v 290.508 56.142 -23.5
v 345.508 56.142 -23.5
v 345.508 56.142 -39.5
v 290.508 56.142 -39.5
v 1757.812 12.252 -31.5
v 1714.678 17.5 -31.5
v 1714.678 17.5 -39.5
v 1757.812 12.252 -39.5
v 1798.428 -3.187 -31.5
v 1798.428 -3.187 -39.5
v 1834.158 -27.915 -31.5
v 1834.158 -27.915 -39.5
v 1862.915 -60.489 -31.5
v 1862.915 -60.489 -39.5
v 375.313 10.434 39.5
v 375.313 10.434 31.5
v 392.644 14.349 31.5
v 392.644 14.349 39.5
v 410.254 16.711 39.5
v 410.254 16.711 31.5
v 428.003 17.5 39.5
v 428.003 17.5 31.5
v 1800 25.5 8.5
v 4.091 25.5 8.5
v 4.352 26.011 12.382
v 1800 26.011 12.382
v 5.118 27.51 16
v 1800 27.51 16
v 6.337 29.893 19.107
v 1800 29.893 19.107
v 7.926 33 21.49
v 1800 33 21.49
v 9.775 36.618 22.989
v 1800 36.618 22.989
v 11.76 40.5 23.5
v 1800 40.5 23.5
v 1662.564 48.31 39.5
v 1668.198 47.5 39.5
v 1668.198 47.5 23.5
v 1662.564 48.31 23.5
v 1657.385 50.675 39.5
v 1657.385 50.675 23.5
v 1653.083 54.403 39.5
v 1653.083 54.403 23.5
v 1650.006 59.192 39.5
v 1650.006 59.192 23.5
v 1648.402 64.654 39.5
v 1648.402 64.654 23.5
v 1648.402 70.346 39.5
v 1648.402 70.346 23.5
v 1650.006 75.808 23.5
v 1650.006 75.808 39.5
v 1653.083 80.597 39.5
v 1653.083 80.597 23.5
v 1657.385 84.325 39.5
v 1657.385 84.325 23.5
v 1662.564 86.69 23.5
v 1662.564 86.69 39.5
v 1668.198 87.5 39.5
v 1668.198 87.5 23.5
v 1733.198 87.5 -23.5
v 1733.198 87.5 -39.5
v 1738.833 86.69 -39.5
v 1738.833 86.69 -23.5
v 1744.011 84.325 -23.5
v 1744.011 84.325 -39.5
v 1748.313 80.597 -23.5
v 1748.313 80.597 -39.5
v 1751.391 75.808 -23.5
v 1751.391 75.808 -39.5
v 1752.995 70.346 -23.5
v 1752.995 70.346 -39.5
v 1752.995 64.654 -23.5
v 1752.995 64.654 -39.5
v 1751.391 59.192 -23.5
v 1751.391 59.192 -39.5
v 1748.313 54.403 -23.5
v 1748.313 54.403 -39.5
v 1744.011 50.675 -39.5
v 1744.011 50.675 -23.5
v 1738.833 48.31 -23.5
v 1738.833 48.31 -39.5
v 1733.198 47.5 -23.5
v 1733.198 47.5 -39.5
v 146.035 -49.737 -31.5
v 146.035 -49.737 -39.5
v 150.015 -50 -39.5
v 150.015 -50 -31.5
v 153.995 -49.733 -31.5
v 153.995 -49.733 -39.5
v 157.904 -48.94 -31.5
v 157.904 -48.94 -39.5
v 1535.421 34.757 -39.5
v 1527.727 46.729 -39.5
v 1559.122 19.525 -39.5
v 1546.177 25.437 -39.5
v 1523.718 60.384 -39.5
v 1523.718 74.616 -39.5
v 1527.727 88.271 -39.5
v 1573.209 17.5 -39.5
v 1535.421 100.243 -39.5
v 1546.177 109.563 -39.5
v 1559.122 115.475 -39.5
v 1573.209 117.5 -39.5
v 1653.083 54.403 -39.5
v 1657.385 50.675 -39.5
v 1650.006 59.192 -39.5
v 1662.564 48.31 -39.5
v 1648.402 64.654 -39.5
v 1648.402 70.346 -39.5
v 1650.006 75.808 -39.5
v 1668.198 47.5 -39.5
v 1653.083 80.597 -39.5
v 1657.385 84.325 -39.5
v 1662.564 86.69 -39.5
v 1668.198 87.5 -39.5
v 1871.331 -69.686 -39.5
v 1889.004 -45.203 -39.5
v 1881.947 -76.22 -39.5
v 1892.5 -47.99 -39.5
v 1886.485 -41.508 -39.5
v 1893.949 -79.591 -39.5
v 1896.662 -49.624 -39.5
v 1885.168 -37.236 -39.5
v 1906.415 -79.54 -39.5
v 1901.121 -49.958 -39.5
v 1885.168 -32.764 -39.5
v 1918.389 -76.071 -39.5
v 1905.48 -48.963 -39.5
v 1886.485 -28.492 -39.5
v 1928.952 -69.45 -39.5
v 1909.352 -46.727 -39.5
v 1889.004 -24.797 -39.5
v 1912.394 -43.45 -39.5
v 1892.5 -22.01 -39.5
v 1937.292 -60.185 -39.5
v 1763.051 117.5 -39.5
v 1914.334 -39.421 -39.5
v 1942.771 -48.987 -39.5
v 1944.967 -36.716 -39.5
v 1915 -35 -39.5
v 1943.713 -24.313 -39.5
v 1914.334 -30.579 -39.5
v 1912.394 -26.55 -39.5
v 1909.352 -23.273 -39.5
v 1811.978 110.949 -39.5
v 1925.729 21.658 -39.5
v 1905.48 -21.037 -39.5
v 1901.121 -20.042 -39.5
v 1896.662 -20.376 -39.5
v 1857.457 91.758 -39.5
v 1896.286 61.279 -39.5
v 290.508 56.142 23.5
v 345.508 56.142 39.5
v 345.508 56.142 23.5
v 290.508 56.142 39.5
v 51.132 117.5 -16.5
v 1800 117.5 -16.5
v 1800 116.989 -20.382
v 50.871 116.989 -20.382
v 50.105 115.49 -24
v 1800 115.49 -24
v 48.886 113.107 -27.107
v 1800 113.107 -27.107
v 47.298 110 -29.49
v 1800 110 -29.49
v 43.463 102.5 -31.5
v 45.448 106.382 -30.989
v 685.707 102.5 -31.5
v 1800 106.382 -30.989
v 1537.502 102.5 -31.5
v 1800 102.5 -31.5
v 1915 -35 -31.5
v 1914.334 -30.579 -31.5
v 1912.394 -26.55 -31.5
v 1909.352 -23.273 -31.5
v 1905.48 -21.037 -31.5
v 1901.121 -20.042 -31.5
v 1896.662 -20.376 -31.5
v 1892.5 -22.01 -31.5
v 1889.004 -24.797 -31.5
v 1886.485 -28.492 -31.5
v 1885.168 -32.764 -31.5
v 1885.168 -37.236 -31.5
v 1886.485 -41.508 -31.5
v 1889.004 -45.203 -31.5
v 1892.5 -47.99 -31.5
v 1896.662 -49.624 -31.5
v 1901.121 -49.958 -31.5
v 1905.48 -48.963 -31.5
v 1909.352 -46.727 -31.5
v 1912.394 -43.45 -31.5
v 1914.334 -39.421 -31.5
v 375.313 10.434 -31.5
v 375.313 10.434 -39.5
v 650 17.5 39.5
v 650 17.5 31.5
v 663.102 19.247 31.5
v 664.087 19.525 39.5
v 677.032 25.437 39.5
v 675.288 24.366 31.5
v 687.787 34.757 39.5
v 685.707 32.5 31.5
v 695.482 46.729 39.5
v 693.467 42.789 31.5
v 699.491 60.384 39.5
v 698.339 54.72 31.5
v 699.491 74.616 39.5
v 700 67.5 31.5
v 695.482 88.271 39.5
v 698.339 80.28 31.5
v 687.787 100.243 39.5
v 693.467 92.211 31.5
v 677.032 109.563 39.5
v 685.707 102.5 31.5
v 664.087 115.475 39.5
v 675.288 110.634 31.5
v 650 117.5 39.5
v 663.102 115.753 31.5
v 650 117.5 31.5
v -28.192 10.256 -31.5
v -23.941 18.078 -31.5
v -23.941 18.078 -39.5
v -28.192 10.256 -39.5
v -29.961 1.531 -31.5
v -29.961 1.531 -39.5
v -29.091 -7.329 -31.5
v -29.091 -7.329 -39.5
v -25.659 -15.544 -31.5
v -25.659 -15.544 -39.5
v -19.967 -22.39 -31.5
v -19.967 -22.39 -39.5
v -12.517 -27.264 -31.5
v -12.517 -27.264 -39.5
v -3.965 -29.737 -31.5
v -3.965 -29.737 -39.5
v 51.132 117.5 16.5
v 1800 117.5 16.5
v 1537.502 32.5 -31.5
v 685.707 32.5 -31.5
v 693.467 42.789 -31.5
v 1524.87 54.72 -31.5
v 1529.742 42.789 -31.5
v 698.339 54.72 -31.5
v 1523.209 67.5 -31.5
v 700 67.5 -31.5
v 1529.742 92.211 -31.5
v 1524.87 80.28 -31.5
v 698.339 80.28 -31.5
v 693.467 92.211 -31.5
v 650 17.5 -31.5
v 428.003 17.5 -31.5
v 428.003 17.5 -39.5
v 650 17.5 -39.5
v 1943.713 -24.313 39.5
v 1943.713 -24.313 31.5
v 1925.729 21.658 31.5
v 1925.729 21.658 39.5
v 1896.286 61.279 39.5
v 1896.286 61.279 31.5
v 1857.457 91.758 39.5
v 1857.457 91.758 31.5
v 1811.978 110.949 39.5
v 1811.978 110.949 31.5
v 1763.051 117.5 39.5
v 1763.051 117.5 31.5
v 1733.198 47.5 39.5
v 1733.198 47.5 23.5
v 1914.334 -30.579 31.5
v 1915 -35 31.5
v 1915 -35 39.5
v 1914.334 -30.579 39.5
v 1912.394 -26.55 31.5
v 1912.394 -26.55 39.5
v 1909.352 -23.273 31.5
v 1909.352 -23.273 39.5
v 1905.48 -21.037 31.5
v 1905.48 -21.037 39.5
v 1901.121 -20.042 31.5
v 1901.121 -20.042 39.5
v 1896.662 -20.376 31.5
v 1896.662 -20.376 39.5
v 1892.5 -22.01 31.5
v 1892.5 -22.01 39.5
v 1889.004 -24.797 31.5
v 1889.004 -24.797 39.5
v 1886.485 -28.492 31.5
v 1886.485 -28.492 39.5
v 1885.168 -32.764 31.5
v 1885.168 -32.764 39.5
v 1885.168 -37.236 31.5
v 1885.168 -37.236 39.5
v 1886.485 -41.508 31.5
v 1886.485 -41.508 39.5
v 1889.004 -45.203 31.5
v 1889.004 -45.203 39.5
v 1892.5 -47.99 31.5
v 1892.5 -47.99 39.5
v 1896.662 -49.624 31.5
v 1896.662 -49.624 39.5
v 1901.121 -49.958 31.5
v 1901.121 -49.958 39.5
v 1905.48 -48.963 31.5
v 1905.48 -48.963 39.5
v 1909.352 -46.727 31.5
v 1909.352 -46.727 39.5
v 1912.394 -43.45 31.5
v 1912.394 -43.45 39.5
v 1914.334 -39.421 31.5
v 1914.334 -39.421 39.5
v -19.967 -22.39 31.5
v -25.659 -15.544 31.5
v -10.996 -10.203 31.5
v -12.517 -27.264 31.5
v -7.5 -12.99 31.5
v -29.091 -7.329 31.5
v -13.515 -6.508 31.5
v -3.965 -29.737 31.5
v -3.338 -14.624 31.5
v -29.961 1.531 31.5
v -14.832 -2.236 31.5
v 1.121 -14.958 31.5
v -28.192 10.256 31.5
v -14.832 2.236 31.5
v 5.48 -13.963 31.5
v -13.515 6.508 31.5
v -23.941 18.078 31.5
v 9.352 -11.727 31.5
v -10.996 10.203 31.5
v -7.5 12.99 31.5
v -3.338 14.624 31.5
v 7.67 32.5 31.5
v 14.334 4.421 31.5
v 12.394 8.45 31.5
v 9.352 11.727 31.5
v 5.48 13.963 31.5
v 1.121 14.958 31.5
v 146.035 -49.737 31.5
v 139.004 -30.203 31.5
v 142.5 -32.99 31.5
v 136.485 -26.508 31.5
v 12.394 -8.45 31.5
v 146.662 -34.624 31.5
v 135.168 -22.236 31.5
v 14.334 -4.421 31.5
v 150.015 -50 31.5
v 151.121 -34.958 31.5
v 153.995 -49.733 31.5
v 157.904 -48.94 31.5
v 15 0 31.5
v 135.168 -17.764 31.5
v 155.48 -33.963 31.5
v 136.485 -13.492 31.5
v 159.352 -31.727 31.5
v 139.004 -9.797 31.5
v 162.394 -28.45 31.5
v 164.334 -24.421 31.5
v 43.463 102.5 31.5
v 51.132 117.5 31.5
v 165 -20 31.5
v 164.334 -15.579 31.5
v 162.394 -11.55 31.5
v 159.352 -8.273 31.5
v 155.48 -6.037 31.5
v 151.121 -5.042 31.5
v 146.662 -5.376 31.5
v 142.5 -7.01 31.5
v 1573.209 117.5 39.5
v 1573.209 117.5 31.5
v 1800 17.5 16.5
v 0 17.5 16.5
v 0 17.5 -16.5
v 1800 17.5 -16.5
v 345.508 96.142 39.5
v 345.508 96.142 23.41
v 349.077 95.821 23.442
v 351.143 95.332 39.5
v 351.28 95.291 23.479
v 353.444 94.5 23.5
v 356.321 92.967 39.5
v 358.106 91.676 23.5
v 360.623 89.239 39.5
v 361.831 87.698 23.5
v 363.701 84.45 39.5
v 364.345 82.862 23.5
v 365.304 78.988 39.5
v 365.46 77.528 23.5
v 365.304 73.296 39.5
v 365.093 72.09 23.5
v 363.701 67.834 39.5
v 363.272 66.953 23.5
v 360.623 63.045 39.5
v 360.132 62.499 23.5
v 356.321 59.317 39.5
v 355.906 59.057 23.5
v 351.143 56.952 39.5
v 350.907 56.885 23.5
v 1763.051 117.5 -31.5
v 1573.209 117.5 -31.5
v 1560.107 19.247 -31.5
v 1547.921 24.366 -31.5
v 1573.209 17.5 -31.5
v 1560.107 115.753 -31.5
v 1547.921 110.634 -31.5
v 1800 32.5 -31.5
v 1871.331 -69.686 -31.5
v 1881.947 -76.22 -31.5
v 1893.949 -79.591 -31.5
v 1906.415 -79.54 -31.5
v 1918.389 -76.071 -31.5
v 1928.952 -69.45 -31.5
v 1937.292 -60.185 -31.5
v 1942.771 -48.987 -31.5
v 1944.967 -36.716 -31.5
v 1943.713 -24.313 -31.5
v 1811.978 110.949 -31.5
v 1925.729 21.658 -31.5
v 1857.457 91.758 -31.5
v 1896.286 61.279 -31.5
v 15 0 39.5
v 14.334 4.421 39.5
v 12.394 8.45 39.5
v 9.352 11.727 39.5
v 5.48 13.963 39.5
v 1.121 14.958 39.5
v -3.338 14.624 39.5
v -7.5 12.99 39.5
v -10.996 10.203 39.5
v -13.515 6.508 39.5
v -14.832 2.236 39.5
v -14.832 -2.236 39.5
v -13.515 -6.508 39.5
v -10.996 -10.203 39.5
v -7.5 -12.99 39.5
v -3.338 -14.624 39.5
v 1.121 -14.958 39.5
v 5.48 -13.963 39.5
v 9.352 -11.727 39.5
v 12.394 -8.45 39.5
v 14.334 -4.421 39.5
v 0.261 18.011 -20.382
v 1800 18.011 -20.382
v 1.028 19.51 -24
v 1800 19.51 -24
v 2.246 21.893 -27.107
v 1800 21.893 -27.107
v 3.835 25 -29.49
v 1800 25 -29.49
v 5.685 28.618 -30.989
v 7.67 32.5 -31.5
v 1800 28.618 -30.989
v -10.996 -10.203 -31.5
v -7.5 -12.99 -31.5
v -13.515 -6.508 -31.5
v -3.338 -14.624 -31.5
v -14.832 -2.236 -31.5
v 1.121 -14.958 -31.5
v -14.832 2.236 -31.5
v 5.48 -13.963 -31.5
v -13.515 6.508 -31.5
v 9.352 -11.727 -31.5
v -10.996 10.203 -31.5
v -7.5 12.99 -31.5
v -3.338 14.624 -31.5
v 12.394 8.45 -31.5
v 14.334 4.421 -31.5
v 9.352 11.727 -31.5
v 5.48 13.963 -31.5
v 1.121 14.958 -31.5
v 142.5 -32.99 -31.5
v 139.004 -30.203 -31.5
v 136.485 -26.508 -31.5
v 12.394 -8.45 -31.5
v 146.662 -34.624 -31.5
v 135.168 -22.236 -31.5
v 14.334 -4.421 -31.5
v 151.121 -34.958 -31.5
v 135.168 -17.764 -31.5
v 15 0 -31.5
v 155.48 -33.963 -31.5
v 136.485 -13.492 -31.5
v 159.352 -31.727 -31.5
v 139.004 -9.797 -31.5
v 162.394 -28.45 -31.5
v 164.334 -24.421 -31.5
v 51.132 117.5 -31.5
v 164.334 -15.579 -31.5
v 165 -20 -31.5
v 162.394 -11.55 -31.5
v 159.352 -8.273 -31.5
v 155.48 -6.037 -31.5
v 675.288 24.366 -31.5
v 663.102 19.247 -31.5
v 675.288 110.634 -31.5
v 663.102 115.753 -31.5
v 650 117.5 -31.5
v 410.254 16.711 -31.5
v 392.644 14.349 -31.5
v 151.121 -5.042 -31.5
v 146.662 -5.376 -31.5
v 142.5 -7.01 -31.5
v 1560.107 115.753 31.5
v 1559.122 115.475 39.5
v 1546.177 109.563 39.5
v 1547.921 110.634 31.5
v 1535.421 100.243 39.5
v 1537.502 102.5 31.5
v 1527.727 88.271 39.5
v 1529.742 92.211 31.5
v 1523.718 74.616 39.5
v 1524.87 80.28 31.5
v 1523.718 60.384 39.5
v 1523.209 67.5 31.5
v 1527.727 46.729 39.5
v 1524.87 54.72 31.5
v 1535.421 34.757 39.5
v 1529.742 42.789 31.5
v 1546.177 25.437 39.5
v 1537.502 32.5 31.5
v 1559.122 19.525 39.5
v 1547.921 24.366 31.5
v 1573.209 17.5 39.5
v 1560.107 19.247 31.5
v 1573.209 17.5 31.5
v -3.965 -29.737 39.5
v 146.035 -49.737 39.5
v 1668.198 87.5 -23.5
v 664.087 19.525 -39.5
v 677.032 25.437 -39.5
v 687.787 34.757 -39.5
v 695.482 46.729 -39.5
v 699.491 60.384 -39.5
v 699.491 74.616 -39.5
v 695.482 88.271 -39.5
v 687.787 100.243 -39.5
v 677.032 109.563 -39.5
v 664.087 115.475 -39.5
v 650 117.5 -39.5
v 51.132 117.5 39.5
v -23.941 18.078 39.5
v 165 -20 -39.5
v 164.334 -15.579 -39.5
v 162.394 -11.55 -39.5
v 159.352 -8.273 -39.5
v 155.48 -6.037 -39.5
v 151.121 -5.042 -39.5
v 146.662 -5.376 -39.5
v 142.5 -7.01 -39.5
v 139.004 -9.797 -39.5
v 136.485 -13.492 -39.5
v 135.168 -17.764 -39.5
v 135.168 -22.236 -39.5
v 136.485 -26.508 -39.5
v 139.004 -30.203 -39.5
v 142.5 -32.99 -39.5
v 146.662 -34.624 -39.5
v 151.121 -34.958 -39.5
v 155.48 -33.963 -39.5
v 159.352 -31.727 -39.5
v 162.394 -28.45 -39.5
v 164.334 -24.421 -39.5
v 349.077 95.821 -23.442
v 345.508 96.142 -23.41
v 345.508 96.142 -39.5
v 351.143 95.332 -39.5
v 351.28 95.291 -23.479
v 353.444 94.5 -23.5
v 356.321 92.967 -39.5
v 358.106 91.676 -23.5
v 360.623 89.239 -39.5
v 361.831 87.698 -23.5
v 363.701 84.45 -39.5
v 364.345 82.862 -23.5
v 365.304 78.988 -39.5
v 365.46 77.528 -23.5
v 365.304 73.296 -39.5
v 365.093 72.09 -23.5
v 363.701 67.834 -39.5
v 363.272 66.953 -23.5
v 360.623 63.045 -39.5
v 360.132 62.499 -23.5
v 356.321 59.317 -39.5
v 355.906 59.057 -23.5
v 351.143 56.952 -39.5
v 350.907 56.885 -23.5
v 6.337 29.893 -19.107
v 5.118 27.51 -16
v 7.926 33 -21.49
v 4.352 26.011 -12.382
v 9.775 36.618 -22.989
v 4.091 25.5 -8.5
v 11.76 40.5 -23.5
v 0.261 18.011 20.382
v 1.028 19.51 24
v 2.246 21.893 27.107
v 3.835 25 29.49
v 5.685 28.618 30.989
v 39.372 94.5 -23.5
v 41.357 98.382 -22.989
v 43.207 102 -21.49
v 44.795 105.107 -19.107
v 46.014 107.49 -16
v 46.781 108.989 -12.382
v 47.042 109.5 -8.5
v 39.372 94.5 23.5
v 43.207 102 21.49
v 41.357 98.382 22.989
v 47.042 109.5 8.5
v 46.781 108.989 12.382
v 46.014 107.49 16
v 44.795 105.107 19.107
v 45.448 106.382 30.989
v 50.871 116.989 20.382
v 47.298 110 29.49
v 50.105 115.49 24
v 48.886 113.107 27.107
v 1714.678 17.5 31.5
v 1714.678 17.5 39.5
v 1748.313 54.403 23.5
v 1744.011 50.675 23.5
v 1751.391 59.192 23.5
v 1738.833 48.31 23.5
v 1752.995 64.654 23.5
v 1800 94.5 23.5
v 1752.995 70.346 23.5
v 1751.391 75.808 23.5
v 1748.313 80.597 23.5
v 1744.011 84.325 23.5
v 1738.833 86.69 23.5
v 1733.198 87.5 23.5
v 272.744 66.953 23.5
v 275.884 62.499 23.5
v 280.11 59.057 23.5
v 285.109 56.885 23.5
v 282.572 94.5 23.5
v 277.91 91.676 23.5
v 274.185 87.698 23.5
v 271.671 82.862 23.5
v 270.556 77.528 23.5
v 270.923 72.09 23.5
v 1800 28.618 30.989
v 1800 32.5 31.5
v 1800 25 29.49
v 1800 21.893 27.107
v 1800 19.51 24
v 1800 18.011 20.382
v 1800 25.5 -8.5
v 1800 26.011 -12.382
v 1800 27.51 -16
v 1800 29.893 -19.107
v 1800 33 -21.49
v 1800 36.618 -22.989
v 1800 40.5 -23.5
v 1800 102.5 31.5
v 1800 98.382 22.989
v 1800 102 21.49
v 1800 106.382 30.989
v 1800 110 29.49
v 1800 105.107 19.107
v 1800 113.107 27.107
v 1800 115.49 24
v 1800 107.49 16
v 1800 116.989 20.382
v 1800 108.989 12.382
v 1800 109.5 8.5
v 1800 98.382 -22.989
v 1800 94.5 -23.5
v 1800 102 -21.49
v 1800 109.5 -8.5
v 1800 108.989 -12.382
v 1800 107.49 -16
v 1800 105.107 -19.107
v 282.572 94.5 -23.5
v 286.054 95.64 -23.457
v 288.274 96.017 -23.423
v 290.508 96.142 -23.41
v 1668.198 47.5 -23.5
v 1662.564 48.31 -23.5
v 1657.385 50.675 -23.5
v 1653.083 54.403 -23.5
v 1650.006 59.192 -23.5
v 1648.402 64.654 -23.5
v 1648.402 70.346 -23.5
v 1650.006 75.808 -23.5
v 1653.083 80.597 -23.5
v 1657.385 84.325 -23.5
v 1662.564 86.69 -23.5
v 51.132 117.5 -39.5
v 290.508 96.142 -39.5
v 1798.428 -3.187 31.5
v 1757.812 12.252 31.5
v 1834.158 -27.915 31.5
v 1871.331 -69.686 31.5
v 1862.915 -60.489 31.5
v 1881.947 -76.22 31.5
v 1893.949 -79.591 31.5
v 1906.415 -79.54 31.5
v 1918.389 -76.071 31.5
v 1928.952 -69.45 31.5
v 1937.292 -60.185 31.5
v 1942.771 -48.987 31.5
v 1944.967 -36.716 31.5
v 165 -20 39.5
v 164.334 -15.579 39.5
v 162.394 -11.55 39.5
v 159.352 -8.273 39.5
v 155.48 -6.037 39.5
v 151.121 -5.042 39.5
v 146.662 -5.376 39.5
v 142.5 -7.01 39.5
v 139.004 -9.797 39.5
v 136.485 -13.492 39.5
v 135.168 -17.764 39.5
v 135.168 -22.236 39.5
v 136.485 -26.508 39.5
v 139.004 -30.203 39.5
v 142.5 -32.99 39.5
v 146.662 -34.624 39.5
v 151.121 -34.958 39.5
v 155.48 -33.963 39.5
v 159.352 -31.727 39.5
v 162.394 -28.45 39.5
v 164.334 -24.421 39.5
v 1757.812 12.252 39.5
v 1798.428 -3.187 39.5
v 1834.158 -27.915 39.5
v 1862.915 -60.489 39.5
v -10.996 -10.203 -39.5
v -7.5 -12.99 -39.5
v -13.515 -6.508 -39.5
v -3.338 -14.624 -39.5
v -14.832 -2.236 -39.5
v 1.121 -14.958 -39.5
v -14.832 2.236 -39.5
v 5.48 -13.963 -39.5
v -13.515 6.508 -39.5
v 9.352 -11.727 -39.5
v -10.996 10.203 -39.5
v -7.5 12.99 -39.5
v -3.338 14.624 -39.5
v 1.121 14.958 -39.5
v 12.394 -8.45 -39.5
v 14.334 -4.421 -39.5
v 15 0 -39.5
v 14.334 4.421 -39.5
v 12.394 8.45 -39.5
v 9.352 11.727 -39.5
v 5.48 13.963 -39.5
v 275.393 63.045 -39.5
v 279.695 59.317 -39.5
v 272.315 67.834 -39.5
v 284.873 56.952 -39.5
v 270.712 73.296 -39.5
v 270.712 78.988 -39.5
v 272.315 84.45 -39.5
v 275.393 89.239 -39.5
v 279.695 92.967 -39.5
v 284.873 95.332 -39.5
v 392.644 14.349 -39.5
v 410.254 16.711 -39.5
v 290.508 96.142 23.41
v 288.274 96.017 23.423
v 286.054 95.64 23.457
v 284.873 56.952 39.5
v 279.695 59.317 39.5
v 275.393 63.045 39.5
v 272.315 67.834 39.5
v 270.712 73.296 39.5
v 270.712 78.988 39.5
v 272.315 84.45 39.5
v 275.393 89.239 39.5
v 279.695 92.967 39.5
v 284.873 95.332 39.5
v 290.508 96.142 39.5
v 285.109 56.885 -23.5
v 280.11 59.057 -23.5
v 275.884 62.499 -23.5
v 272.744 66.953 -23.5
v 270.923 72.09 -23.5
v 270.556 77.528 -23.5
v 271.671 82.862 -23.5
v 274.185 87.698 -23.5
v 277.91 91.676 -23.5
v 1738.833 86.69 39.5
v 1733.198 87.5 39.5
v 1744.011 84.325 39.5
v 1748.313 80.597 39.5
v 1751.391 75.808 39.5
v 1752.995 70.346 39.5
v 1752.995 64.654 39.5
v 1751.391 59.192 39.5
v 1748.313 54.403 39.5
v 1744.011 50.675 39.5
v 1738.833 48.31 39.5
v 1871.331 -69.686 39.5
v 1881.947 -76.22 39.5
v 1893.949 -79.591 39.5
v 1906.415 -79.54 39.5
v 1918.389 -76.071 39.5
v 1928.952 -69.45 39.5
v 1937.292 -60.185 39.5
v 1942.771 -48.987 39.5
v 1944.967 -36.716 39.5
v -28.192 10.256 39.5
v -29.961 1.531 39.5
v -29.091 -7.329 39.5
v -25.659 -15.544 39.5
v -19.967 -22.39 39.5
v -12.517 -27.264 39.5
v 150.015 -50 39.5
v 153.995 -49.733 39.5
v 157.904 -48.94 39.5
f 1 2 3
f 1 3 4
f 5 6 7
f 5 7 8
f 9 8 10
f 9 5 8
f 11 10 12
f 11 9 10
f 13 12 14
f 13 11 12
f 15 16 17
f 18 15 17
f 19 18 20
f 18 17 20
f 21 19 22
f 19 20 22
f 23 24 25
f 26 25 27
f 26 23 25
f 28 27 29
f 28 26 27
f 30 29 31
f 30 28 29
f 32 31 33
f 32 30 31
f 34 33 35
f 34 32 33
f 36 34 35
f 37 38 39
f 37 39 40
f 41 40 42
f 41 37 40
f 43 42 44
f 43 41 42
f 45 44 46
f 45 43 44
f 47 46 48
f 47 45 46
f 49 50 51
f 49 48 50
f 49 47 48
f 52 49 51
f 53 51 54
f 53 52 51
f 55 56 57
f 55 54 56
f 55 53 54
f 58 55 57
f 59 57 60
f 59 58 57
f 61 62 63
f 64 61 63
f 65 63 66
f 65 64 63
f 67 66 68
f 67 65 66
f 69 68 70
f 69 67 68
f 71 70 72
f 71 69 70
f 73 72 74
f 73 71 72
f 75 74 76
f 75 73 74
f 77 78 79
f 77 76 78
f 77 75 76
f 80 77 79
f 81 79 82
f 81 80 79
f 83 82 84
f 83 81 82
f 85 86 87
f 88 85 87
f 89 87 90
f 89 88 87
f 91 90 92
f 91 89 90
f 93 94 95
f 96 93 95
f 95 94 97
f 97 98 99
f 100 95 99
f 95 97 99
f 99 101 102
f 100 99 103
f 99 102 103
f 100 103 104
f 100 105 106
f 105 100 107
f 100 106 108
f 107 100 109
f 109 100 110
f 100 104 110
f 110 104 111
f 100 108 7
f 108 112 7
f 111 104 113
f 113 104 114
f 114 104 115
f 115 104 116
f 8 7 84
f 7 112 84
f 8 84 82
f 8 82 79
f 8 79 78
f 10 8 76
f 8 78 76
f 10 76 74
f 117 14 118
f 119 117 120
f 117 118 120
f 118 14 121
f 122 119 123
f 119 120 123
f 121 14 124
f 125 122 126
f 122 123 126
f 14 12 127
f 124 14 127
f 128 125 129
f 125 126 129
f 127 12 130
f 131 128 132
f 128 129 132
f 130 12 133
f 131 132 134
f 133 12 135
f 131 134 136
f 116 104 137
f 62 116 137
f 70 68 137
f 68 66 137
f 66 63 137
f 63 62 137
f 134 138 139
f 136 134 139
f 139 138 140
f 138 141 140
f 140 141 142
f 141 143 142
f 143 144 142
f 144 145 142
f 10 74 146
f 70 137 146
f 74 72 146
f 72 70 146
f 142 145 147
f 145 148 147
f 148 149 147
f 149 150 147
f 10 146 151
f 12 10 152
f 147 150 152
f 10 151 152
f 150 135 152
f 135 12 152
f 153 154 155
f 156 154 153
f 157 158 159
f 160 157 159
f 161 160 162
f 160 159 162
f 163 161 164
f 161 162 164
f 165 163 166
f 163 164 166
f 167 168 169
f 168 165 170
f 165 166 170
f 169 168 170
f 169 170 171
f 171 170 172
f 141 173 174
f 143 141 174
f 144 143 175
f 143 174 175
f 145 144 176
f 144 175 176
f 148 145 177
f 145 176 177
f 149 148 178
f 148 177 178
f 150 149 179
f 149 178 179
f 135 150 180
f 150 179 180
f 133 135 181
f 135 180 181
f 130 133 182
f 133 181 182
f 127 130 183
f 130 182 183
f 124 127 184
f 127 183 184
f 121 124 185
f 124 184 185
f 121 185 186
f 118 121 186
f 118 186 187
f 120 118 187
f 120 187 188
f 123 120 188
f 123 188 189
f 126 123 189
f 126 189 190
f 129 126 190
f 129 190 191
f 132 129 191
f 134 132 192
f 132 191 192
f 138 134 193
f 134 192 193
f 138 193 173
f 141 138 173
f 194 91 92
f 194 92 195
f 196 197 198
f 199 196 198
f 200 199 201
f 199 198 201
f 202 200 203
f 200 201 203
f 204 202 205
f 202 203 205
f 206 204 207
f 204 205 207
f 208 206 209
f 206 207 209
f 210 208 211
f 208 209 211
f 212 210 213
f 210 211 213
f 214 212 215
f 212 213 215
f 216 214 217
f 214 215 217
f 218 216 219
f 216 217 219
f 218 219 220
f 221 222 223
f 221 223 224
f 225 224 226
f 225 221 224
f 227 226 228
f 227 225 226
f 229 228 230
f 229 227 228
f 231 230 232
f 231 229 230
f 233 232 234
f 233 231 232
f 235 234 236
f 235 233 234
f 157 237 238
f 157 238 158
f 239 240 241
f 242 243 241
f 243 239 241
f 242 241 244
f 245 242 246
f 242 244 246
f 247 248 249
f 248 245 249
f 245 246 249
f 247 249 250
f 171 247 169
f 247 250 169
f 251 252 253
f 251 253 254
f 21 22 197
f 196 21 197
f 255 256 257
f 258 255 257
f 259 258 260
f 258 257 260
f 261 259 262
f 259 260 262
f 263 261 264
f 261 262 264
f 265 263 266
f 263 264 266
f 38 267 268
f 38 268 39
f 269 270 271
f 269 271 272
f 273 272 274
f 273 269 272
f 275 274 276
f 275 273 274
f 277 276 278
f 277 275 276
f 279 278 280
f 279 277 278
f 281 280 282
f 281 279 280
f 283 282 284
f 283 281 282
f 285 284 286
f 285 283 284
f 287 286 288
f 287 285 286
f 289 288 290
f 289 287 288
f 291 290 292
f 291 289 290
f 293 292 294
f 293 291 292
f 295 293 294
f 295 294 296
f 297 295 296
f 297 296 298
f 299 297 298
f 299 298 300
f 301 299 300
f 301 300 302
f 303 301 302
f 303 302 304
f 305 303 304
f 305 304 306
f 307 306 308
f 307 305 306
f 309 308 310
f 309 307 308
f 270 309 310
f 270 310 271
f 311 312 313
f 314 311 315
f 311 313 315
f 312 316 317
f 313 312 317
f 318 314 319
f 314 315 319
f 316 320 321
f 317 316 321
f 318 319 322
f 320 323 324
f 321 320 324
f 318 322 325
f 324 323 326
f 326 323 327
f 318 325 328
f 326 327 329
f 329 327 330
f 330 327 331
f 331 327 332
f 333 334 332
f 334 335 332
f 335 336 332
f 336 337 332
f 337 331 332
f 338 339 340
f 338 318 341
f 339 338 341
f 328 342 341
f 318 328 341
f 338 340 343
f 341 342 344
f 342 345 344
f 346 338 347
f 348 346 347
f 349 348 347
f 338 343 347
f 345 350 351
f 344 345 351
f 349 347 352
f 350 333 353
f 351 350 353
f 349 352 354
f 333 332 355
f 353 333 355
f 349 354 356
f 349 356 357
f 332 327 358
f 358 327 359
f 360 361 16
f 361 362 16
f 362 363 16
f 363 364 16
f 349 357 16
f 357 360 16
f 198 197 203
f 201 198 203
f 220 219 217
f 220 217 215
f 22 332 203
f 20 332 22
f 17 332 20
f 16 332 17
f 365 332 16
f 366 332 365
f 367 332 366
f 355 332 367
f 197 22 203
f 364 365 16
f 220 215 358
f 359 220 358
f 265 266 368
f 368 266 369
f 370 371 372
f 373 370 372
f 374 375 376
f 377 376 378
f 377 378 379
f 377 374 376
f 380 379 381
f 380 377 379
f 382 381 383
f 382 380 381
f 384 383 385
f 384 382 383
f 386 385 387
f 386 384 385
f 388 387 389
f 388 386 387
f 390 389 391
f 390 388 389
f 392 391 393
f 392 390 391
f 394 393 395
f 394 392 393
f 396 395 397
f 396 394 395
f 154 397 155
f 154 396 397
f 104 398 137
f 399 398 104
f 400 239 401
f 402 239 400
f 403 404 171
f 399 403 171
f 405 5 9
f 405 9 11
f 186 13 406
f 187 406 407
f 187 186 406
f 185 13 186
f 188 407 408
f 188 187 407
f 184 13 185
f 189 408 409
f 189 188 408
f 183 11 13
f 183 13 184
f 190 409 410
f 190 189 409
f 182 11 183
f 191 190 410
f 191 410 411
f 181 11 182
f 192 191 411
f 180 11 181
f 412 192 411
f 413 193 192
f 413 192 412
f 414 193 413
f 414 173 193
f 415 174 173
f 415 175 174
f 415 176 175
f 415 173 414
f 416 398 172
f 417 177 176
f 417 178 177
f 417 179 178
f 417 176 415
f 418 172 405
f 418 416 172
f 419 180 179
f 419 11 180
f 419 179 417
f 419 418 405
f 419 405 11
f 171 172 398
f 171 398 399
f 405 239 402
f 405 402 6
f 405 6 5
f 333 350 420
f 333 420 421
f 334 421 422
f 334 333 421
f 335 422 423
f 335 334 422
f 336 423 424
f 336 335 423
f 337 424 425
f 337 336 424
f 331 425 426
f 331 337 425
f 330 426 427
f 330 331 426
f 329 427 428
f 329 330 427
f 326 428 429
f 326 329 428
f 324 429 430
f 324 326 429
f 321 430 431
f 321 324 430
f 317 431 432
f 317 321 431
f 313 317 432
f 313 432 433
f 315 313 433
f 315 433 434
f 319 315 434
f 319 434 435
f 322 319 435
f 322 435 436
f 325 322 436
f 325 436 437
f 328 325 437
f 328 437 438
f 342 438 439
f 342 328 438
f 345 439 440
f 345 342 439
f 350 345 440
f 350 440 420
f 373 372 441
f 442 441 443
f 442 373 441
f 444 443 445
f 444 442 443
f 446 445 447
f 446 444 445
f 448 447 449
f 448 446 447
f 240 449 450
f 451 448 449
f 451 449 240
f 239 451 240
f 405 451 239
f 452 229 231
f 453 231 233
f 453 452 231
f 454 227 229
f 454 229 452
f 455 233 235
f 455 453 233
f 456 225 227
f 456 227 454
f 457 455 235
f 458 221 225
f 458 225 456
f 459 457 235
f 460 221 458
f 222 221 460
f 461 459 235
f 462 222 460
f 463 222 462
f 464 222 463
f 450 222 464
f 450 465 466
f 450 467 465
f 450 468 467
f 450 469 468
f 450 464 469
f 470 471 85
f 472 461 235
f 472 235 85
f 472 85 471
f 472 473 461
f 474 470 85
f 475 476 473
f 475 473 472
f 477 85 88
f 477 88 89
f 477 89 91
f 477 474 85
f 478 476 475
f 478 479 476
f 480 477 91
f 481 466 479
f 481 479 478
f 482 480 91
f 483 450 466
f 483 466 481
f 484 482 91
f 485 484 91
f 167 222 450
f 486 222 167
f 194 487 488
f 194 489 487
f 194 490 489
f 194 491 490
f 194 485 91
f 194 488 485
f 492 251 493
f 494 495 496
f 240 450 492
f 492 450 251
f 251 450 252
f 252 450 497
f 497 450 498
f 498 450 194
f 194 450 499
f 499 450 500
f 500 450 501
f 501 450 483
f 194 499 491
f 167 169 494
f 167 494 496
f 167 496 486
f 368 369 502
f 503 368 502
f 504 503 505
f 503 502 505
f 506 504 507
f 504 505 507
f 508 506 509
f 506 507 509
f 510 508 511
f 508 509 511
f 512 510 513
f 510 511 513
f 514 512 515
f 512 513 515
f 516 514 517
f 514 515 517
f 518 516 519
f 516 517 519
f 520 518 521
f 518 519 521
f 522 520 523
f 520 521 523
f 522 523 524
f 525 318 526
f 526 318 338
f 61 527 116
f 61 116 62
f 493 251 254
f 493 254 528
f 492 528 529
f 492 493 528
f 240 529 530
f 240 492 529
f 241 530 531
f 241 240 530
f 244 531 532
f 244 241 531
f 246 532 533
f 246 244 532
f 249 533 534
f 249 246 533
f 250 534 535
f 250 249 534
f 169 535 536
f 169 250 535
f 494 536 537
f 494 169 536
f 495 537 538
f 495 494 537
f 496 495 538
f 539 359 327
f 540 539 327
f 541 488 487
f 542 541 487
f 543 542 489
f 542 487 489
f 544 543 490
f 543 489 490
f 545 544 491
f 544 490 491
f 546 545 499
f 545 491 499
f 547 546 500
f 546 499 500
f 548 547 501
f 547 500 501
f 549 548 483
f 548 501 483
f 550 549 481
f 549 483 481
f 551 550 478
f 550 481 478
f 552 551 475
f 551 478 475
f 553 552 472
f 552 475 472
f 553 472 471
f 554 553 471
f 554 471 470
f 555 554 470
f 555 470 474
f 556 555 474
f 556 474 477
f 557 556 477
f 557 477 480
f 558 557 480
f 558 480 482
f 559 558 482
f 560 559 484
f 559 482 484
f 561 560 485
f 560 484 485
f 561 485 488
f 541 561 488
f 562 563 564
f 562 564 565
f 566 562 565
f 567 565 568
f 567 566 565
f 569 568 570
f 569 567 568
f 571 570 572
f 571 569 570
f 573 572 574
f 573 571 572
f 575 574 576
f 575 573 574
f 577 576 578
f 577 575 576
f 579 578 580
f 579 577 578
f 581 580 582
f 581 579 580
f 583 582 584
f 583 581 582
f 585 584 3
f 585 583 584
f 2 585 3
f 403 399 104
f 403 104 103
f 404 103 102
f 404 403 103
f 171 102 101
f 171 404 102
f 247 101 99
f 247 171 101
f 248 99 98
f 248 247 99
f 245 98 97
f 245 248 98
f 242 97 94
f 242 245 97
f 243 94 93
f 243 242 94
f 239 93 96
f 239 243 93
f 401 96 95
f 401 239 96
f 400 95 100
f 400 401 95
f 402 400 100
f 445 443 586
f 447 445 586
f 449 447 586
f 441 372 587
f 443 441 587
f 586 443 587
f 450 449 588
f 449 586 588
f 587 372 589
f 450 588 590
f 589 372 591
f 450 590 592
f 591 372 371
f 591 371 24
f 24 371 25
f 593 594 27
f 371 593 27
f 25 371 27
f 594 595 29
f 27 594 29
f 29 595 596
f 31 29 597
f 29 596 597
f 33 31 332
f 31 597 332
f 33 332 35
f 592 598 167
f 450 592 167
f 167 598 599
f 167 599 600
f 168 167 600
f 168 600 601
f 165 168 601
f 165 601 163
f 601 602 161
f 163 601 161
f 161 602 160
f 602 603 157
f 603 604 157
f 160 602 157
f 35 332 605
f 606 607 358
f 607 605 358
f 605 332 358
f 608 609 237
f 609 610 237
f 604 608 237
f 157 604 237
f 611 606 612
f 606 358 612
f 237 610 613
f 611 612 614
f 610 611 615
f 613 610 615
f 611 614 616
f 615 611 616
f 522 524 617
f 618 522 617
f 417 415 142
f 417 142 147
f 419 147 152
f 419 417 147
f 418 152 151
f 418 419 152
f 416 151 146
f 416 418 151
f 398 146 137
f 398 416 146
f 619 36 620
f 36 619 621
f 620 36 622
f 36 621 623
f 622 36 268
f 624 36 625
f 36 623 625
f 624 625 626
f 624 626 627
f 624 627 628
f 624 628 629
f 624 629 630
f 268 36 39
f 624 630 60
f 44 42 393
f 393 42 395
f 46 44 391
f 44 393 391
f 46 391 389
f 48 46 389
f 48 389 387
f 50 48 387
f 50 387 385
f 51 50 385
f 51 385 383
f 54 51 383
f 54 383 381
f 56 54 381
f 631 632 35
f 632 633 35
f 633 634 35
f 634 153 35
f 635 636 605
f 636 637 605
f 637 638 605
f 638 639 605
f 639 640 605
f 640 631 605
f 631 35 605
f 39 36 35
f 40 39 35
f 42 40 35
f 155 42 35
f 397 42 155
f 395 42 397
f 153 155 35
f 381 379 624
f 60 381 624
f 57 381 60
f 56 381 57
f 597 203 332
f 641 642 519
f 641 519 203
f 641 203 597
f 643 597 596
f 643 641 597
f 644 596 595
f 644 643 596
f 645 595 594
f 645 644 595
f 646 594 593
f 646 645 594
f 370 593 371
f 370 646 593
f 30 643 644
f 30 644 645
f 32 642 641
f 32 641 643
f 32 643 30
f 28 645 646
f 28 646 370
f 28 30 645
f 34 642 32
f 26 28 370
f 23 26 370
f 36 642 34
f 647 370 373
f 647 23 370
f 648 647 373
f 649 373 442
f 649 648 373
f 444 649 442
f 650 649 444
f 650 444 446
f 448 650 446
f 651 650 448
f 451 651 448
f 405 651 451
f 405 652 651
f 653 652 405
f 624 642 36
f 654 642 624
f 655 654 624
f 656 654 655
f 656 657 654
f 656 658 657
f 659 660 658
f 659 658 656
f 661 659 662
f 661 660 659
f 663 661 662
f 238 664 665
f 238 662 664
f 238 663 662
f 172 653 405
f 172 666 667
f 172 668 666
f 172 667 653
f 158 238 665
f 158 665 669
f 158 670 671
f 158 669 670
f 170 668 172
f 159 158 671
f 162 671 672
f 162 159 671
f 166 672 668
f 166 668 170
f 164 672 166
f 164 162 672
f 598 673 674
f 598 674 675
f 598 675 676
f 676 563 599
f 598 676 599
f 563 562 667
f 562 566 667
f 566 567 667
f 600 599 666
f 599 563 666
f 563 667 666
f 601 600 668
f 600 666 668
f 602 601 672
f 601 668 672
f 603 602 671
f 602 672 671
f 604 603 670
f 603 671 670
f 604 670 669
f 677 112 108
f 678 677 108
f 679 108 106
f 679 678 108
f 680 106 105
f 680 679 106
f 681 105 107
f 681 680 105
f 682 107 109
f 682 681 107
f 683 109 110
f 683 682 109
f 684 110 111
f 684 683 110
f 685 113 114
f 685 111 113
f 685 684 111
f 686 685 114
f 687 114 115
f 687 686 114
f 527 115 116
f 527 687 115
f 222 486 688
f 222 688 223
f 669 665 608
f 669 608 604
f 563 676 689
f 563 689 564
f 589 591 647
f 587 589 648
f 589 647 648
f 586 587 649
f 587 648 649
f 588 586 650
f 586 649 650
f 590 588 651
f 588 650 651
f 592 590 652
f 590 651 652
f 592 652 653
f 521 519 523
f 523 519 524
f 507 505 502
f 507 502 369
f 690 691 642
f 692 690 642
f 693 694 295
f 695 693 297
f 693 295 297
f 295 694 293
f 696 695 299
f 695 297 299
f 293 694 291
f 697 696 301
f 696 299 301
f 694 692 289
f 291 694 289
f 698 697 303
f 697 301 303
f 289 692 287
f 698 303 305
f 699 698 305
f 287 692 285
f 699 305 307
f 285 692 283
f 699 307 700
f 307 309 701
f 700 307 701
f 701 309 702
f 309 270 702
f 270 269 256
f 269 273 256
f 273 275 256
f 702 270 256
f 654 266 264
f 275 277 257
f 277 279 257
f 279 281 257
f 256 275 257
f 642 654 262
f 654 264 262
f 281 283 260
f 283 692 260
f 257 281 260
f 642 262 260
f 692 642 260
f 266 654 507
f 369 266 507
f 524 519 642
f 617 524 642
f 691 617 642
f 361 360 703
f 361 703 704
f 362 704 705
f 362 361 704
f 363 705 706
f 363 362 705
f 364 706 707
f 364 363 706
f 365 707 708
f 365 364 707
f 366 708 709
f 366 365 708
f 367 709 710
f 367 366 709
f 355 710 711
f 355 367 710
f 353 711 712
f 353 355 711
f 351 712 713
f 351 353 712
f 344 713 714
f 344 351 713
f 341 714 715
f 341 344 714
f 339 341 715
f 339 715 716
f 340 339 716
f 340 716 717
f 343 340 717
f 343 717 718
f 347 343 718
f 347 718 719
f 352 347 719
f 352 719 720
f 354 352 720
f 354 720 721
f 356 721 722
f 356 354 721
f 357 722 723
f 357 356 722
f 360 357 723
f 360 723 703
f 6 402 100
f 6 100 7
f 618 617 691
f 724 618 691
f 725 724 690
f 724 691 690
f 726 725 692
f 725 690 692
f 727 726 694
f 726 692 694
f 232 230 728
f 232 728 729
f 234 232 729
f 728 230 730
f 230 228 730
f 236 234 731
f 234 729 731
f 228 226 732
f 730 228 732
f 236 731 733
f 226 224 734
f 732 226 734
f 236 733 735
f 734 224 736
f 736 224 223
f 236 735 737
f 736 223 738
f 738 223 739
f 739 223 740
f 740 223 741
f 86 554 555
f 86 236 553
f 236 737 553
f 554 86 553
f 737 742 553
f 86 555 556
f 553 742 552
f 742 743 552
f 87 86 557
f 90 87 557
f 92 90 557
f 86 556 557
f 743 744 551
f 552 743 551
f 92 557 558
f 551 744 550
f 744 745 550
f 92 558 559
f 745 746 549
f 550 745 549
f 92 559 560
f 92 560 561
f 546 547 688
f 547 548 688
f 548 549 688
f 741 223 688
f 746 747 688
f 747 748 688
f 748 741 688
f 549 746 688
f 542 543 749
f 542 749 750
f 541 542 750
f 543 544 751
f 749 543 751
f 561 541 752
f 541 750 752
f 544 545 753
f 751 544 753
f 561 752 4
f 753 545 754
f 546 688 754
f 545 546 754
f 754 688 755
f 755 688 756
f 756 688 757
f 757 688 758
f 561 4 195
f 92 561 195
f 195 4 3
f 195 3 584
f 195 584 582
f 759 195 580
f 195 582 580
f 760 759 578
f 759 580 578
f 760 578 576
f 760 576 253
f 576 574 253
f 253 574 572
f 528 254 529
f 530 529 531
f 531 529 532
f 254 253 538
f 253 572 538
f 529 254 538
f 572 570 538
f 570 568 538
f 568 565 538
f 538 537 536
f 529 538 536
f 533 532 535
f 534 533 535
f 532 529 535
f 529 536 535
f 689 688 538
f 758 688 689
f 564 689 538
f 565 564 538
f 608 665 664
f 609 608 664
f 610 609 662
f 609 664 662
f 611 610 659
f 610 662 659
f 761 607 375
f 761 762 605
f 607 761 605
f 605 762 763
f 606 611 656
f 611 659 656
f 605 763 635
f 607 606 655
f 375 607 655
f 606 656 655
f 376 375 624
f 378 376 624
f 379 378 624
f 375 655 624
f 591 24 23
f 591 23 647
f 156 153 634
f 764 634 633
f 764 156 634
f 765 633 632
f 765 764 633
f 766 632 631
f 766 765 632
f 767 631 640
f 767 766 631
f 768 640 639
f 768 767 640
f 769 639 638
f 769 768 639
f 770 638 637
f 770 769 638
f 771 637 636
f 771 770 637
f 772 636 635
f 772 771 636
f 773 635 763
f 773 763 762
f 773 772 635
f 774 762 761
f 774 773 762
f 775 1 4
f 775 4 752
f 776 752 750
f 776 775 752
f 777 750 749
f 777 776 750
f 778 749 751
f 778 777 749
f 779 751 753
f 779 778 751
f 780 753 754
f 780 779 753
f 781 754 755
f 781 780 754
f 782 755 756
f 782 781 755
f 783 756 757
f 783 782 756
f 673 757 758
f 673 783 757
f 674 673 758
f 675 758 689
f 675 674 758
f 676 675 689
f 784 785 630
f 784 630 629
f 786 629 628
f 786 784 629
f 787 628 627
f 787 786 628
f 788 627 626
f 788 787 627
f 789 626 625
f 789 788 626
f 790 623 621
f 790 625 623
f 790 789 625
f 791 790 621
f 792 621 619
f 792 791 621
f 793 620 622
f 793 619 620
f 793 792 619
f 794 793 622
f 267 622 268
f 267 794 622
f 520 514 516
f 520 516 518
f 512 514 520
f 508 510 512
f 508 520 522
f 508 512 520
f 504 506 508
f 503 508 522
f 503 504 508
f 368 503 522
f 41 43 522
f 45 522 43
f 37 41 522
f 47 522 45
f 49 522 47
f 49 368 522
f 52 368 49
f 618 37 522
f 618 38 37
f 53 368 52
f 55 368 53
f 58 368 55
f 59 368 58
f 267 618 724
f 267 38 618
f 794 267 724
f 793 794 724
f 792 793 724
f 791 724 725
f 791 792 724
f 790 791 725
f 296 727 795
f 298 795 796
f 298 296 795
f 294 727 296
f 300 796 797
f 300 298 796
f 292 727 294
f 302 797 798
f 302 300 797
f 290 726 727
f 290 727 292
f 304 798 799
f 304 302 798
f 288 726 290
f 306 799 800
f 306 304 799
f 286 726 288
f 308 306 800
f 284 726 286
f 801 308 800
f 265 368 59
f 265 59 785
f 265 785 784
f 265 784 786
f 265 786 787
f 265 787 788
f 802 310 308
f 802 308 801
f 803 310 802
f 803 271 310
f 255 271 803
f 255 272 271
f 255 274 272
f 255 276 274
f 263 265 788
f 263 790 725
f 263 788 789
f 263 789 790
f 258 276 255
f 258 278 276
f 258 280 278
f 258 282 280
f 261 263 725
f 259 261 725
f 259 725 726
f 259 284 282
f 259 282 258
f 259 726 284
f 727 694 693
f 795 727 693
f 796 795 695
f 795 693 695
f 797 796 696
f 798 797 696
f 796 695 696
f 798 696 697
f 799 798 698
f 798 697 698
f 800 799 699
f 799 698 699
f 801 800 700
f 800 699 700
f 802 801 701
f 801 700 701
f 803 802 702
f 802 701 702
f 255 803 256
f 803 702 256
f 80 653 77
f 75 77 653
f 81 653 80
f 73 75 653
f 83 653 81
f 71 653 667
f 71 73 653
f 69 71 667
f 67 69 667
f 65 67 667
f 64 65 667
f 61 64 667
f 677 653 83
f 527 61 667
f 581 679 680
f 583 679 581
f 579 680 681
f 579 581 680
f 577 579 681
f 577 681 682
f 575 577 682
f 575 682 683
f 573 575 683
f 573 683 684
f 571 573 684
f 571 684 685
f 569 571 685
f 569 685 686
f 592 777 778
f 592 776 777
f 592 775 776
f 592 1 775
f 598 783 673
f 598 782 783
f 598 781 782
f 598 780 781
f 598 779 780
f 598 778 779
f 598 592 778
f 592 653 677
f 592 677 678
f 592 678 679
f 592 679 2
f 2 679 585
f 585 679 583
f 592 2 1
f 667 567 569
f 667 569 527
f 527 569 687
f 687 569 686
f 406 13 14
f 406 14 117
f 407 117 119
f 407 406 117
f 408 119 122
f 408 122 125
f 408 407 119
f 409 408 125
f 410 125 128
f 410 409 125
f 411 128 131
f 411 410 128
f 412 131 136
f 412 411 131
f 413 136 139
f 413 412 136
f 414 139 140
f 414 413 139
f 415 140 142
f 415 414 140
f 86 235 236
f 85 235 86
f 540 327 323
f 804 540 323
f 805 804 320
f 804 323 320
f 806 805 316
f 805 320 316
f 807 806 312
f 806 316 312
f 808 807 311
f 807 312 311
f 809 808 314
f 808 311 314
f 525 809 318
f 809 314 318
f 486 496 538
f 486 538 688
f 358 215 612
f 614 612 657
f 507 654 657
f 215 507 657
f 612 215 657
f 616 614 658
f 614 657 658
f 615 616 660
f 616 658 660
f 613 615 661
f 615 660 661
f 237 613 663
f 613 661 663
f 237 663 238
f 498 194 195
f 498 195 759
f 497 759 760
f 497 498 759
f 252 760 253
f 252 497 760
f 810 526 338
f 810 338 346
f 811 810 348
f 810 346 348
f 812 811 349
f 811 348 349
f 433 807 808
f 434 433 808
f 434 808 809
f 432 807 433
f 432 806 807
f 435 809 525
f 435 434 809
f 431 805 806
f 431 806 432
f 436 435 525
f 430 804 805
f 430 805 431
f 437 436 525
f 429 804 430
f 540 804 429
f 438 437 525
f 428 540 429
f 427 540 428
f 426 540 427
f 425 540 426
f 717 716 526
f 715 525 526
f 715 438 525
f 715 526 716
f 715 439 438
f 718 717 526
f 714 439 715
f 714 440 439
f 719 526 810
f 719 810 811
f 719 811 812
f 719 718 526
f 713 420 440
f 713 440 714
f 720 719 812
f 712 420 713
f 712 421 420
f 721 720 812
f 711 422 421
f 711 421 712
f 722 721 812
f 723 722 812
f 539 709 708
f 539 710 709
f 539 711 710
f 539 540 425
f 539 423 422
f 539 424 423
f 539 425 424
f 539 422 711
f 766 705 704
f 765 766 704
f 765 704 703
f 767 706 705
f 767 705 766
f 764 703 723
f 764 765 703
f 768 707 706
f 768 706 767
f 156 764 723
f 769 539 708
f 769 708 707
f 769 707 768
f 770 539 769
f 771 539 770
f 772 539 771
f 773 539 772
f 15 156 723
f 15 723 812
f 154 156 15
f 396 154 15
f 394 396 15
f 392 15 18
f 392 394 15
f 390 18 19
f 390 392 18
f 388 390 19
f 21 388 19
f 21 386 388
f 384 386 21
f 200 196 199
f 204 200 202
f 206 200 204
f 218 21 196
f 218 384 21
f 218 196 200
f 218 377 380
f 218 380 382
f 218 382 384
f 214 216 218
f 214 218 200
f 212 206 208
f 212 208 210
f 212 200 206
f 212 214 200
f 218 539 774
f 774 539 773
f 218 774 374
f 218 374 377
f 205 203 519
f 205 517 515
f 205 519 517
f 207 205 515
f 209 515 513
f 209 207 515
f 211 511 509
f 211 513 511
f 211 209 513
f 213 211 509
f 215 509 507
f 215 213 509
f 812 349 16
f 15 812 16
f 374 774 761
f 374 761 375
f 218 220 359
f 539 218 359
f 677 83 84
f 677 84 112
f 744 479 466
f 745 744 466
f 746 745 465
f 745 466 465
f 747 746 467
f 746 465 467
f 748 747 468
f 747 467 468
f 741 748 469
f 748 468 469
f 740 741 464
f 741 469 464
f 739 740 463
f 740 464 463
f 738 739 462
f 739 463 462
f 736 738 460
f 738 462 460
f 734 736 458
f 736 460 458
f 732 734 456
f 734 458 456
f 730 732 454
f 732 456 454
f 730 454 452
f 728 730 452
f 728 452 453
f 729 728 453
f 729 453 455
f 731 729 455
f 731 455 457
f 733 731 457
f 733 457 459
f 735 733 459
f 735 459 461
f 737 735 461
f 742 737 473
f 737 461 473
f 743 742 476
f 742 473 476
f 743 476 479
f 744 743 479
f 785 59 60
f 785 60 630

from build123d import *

# Parameters (mm, degrees)
SKETCH3_W           = 63
SKETCH3_H           = 100
SKETCH3_W_2         = 47
SKETCH3_H_2         = 84
BOSS_EXTRUDE1_DEPTH = 1800
FILLET1_R           = 15
SKETCH4_R           = 15
BOSS_EXTRUDE2_DEPTH = 8
CUT_EXTRUDE3_DEPTH  = 80
CUT_EXTRUDE5_DEPTH  = 63
SKETCH8_R           = 15
BOSS_EXTRUDE3_DEPTH = 8
CUT_EXTRUDE6_DEPTH  = 80.0000001


with BuildPart() as part:
    # Sketch3 → Boss-Extrude1 (new body)
    with BuildSketch(Plane(origin=(0, 0, 0), x_dir=(0, 0, -1), z_dir=(1, 0, 0))):
        with Locations((0, 67.5)):
            Rectangle(SKETCH3_W, SKETCH3_H)
        with Locations((0, 67.5)):
            Rectangle(SKETCH3_W_2, SKETCH3_H_2, mode=Mode.SUBTRACT)
    extrude(amount=BOSS_EXTRUDE1_DEPTH)

    # Fillet1
    fillet1_edges = [part.edges().sort_by_distance(p)[0] for p in [
        (900, 109.5, 23.5),
        (900, 25.5, 23.5),
        (900, 25.5, -23.5),
        (900, 109.5, -23.5),
        (900, 17.5, -31.5),
        (900, 17.5, 31.5),
        (900, 117.5, 31.5),
        (900, 117.5, -31.5),
    ]]
    fillet(fillet1_edges, radius=FILLET1_R)

    # Sketch4 → Boss-Extrude2 (add)
    with BuildSketch(Plane.XY.offset(31.5)):
        with BuildLine():
            Line((51.132453633, 117.5), (-23.941241068, 18.07807999))
            ThreePointArc((-23.941241068, 18.07807999), (-27.681309785, -11.564821166), (-3.964911603, -29.73683702))
            Line((-3.964911603, -29.73683702), (146.035088397, -49.73683702))
            ThreePointArc((146.035088397, -49.73683702), (152.009214612, -49.932641992), (157.903578304, -48.940170179))
            Line((157.903578304, -48.940170179), (375.312967218, 10.434467861))
            ThreePointArc((375.312967218, 10.434467861), (401.42242053, 15.725747031), (428.003489242, 17.5))
            Line((428.003489242, 17.5), (650, 17.5))
            ThreePointArc((650, 17.5), (700, 67.5), (650, 117.5))
            Line((650, 117.5), (51.132453633, 117.5))
        make_face()
        Circle(SKETCH4_R, mode=Mode.SUBTRACT)
        with Locations((150, -20)):
            Circle(SKETCH4_R, mode=Mode.SUBTRACT)
    boss_extrude2 = extrude(amount=BOSS_EXTRUDE2_DEPTH)

    # Mirror2: Boss-Extrude2 across plane
    add(boss_extrude2.mirror(Plane.XY))

    # Sketch5 → Cut-Extrude3 (cut, through all)
    with BuildSketch(Plane.XY.offset(39.5)):
        with BuildLine():
            Line((290.508026136, 96.142023945), (345.508026136, 96.142023945))
            ThreePointArc((345.508026136, 96.142023945), (365.508026136, 76.142023945), (345.508026136, 56.142023945))
            Line((345.508026136, 56.142023945), (290.508026136, 56.142023945))
            ThreePointArc((290.508026136, 56.142023945), (270.508026136, 76.142023945), (290.508026136, 96.142023945))
        make_face()
    extrude(amount=-CUT_EXTRUDE3_DEPTH, mode=Mode.SUBTRACT)

    # Sketch7 → Cut-Extrude5 (cut)
    with BuildSketch(Plane.XY.offset(31.5)):
        Polygon((0, 17.5), (51.132453633, 117.5), (-2.794234501, 117.5), (-2.794234501, 17.5), align=None)
    extrude(amount=-CUT_EXTRUDE5_DEPTH, mode=Mode.SUBTRACT)

    # Sketch8 → Boss-Extrude3 (add)
    with BuildSketch(Plane.XY.offset(31.5)):
        with BuildLine():
            Line((1573.208774734, 17.5), (1714.67806612, 17.5))
            ThreePointArc((1714.67806612, 17.5), (1798.428366058, -3.186841446), (1862.91487867, -60.489091313))
            ThreePointArc((1862.91487867, -60.489091313), (1918.389175604, -76.071136101), (1943.712509929, -24.312789154))
            ThreePointArc((1943.712509929, -24.312789154), (1877.887370152, 77.812206283), (1763.051214044, 117.5))
            Line((1763.051214044, 117.5), (1573.208774734, 117.5))
            ThreePointArc((1573.208774734, 117.5), (1523.208774734, 67.5), (1573.208774734, 17.5))
        make_face()
        with Locations((1900, -35)):
            Circle(SKETCH8_R, mode=Mode.SUBTRACT)
    boss_extrude3 = extrude(amount=BOSS_EXTRUDE3_DEPTH)

    # Mirror8: Boss-Extrude3 across plane
    add(boss_extrude3.mirror(Plane.XY))

    # Sketch9 → Cut-Extrude6 (cut, through all)
    with BuildSketch(Plane.XY.offset(39.5)):
        with BuildLine():
            Line((1668.198215583, 87.5), (1733.198215583, 87.5))
            ThreePointArc((1733.198215583, 87.5), (1753.198215583, 67.5), (1733.198215583, 47.5))
            Line((1733.198215583, 47.5), (1668.198215583, 47.5))
            ThreePointArc((1668.198215583, 47.5), (1648.198215583, 67.5), (1668.198215583, 87.5))
        make_face()
    extrude(amount=-CUT_EXTRUDE6_DEPTH, mode=Mode.SUBTRACT)


solid = part.part
